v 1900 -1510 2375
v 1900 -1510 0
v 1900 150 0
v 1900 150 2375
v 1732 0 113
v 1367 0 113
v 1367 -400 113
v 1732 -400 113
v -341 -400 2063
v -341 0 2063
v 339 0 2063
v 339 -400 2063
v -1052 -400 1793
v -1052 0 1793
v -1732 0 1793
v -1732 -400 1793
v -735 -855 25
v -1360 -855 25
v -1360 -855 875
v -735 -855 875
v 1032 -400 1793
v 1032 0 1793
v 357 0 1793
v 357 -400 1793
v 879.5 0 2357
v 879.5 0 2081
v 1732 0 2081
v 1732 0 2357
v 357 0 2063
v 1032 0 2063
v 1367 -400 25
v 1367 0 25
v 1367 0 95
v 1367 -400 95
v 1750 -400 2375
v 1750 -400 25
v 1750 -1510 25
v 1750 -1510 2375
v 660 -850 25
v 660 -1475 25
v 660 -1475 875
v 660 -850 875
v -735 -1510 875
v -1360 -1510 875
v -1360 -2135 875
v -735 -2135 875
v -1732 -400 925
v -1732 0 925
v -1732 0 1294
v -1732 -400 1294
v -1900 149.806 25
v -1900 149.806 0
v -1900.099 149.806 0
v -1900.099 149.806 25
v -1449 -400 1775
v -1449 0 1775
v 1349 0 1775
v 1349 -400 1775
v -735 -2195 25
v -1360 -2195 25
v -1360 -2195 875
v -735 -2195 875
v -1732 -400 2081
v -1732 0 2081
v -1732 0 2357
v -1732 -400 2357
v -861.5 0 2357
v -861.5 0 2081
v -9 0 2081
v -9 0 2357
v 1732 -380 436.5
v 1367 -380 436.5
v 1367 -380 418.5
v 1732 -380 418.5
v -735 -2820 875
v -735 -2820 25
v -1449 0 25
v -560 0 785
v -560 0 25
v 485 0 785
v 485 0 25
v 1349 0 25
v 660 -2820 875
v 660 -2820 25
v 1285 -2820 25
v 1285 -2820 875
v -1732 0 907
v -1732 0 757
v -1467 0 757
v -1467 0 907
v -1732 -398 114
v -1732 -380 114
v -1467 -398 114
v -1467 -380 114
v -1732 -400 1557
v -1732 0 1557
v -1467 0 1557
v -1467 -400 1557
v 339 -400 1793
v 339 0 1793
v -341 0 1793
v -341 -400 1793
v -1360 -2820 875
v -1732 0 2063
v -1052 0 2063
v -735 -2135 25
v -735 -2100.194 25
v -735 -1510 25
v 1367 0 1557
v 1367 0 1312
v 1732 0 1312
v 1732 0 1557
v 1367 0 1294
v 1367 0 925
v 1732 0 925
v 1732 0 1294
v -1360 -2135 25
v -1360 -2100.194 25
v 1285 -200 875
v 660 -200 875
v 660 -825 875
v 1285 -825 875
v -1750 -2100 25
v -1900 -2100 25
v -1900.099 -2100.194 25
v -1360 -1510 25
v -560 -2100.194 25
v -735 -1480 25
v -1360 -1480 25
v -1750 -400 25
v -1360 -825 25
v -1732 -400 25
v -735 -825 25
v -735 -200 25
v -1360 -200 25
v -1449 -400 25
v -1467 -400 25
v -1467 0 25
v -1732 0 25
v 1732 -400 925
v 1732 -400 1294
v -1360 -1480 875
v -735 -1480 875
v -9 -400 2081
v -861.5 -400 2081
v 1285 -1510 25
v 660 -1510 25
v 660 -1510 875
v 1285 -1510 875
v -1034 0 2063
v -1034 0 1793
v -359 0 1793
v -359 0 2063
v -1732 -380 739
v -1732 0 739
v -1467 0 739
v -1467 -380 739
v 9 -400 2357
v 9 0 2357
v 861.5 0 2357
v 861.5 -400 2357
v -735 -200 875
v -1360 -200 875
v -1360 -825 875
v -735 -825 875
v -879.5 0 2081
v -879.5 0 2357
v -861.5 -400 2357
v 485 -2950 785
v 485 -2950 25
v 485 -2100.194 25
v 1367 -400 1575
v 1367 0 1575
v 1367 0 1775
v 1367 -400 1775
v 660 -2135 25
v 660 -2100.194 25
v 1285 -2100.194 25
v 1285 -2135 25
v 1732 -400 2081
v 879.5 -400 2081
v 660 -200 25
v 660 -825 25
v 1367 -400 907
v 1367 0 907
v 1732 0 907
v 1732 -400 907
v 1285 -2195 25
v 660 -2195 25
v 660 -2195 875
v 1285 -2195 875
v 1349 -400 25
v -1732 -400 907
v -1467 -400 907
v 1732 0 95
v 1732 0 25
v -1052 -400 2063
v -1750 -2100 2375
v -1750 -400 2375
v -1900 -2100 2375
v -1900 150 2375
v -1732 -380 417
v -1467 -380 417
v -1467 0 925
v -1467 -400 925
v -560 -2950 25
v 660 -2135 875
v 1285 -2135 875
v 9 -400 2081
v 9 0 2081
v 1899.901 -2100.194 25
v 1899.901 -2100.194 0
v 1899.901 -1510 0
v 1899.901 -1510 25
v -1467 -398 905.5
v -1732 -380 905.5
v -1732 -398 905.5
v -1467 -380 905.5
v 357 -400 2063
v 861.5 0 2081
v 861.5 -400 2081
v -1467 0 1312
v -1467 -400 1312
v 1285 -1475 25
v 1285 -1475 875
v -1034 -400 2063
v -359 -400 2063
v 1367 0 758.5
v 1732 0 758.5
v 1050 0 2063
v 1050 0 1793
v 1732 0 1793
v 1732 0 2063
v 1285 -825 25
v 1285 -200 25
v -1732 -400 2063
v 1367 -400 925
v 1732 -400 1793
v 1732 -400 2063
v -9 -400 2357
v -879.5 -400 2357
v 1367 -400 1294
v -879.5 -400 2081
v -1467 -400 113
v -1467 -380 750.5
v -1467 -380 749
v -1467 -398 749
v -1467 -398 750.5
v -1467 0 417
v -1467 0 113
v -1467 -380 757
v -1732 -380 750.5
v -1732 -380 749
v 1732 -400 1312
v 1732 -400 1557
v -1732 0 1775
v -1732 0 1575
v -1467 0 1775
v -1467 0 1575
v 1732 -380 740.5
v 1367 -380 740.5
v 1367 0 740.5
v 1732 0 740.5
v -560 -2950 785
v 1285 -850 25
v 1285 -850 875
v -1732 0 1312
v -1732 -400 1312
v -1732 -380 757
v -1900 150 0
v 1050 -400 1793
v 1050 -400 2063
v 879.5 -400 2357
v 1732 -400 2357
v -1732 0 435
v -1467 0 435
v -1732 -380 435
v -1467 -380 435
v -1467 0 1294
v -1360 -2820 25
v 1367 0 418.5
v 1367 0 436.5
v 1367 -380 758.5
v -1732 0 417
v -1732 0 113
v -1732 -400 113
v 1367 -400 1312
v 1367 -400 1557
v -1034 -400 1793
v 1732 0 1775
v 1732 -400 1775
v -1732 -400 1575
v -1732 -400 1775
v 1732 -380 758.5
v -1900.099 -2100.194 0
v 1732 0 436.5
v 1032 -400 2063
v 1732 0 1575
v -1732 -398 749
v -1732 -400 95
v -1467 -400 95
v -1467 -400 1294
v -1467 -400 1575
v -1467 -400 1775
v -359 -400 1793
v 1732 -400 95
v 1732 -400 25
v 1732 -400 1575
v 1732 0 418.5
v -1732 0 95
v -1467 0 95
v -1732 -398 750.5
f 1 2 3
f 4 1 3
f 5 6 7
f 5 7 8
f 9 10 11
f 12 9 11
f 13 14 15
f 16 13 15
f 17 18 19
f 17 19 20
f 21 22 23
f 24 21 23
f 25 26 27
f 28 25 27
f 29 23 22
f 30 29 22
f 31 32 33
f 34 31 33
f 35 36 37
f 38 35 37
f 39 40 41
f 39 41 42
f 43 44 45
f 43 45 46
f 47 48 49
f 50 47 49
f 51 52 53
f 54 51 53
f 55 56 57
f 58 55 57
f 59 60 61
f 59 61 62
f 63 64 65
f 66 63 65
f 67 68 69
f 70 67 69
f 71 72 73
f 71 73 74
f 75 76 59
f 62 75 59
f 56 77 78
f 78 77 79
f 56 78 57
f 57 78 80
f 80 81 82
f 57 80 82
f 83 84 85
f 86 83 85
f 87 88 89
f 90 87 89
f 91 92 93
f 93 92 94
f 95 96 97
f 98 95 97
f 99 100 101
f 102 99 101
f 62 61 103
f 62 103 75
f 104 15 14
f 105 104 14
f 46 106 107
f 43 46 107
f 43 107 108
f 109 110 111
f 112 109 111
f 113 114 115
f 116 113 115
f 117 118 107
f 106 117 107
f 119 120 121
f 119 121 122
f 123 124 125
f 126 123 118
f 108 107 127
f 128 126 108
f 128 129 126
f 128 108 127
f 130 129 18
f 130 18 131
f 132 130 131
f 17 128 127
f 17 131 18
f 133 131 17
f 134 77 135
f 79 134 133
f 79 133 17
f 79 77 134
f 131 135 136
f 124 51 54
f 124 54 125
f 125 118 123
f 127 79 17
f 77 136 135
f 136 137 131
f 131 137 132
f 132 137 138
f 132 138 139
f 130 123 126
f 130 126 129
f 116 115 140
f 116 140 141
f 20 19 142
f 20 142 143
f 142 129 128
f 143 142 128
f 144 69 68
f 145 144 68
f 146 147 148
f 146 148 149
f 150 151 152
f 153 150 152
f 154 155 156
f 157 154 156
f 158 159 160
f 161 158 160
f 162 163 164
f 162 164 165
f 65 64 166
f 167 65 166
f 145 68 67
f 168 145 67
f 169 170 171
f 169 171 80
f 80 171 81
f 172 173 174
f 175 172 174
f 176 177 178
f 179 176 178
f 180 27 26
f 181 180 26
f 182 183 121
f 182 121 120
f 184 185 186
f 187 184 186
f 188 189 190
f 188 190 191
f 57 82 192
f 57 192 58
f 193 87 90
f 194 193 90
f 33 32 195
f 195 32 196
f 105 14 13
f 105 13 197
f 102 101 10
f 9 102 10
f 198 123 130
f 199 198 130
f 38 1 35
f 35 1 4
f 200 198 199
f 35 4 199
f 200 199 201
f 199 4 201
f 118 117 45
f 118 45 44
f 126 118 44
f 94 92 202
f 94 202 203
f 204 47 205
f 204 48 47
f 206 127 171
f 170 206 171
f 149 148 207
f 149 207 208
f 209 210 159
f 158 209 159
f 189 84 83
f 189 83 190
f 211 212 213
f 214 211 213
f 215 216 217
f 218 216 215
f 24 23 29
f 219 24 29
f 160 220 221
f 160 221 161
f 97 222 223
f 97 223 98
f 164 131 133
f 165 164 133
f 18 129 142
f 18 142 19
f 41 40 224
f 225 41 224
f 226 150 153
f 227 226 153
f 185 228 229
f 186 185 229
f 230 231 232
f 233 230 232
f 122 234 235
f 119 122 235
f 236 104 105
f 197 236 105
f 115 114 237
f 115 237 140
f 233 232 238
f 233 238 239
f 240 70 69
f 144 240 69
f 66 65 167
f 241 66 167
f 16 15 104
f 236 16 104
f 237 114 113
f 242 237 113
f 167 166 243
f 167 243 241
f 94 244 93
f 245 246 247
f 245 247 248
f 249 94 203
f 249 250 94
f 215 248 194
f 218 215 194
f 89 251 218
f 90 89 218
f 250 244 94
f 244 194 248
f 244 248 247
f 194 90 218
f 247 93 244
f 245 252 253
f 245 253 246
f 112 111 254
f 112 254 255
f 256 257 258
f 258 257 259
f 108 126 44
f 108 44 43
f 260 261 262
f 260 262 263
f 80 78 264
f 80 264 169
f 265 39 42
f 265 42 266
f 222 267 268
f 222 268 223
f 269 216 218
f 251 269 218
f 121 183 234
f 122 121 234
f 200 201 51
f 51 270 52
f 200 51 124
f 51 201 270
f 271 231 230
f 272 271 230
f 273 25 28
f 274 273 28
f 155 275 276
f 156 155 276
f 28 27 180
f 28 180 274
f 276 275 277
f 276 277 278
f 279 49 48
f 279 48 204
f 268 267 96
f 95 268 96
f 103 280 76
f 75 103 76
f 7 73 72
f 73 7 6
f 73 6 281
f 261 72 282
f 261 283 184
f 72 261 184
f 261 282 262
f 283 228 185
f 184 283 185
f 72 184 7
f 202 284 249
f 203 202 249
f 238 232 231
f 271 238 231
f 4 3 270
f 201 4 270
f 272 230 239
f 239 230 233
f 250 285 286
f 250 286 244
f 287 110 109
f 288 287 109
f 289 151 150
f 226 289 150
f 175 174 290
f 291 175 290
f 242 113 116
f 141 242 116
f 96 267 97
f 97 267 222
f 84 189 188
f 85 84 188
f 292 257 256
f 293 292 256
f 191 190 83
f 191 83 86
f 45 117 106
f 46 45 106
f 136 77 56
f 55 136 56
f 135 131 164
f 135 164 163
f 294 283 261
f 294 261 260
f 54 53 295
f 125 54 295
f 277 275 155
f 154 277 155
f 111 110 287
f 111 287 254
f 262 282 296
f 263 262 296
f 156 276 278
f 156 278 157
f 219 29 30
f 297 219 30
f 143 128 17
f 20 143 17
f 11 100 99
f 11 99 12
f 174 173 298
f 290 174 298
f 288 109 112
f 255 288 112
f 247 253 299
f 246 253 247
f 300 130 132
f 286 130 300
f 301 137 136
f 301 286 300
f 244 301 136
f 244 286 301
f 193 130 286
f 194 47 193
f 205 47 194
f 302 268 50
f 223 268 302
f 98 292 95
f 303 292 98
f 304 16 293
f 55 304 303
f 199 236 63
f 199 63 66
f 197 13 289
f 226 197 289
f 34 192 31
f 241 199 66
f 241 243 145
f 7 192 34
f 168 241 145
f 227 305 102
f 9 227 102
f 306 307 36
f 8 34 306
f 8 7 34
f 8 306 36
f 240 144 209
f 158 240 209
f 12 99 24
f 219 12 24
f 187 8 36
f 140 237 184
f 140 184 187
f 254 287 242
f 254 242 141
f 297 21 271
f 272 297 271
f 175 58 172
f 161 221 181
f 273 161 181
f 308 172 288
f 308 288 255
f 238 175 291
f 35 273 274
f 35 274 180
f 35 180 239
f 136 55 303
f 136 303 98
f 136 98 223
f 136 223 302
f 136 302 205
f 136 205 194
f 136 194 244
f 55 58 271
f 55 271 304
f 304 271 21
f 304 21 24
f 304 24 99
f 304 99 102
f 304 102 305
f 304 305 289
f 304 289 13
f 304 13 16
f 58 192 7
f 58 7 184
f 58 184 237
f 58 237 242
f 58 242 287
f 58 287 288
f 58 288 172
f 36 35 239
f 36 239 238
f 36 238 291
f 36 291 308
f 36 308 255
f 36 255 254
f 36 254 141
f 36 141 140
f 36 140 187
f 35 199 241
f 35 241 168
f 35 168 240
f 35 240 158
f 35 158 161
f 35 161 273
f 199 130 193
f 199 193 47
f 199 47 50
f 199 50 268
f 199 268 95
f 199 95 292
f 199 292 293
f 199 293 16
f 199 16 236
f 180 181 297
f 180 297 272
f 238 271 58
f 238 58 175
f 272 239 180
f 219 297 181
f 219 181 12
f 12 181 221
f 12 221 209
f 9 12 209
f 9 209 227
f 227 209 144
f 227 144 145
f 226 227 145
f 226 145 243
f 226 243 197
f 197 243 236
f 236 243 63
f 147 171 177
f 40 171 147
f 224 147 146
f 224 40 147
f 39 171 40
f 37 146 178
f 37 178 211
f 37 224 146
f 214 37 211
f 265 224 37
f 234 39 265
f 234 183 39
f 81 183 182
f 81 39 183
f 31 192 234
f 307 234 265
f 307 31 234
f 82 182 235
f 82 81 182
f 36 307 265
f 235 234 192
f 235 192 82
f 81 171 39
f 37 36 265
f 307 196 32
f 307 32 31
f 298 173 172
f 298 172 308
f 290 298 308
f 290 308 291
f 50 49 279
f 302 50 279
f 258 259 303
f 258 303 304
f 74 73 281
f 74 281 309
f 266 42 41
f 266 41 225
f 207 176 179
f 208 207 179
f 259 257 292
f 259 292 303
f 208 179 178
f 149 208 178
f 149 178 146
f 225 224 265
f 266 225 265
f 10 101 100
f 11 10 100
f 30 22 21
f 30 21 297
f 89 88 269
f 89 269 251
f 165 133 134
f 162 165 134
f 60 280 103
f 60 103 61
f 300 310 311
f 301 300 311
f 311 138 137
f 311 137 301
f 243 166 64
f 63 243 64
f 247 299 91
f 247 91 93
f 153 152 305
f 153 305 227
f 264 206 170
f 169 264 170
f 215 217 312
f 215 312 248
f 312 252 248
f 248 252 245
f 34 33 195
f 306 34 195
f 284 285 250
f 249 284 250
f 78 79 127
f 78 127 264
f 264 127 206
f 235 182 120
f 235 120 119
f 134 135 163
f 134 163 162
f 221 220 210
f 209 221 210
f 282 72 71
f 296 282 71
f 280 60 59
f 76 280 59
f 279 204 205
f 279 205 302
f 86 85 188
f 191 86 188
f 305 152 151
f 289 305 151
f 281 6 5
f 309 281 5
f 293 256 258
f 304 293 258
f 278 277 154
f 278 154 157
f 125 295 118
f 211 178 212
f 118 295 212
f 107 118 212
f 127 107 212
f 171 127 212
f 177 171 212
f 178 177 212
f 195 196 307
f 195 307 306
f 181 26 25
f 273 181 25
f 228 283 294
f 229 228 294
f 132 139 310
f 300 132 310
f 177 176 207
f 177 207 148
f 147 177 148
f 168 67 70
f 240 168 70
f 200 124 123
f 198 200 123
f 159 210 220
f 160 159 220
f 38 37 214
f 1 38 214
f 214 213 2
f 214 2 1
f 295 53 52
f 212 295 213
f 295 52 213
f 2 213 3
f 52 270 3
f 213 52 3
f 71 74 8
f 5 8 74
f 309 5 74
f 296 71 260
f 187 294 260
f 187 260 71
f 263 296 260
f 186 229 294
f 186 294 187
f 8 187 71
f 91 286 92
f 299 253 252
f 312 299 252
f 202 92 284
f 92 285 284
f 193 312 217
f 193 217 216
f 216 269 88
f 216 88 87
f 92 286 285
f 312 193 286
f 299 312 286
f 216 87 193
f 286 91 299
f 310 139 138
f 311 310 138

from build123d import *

# Parameters (mm, degrees)
F1_DEPTH  = 2375
F3_DEPTH  = 25
F4_W      = 1045
F4_H      = 2100.1937389374
F4_H_2    = 849.8062610626
F5_DEPTH  = 760
F6_W      = 625
F6_H      = 625
F7_DEPTH  = 850
F8_W      = 18
F8_H      = 1750
F8_H_2    = 18
F8_H_3    = 564
F9_DEPTH  = 400
F11_DEPTH = 400
F12_W     = 18
F12_H     = 276
F13_DEPTH = 400
F14_W     = 18
F14_H     = 270
F15_DEPTH = 400
F16_W     = 265
F16_H     = 18
F17_DEPTH = 380
F18_DEPTH = 20
F19_W     = 265
F19_H     = 18
F20_DEPTH = 400
F21_W     = 265
F21_H     = 155
F21_H_2   = 635
F22_DEPTH = 18
F23_W     = 365
F23_H     = 18
F24_DEPTH = 400
F25_W     = 365
F25_H     = 18
F26_DEPTH = 380


with BuildPart() as f1:
    # F0 (on Top) → F1 (new body)
    with BuildSketch(Plane.XY):
        Polygon((-1750, 0), (-1e-10, 0), (1750.0000000001, 0), (1750, -1510), (1900, -1510), (1900, 150), (-1900, 150), (-1900, -2100), (-1750, -2100), align=None)
    extrude(amount=F1_DEPTH)

    # F2 (on face) → F3 (join)
    with BuildSketch(Plane.XY):
        Polygon((-1900.0992774963, 149.8062610626), (-1900.0992774963, -2100.1937389374), (1899.9007225037, -2100.1937389374), (1899.9007225037, -1510), (1750, -1510), (1750, 0), (2e-10, 0), (-1750, 0), (-1750, -2100), (-1900, -2100), (-1900, 149.8062610626), align=None)
    extrude(amount=F3_DEPTH)

    # F4 (on face) → F5 (join)
    with BuildSketch(Plane.XY.offset(25)):
        with Locations((-37.5, -1050.0968694687)):
            Rectangle(F4_W, F4_H)
        with Locations((-37.5, -2525.0968694687)):
            Rectangle(F4_W, F4_H_2)
    extrude(amount=F5_DEPTH)

    # F6 (on face) → F7, piece 2 (join)
    with BuildSketch(Plane.XY.offset(25)):
        with Locations((-1047.5, -1822.5)):
            Rectangle(F6_W, F6_H)
        with Locations((-1047.5, -1167.5)):
            Rectangle(F6_W, F6_H)
        with Locations((-1047.5, -512.5)):
            Rectangle(F6_W, F6_H)
        with Locations((972.5, -512.5)):
            Rectangle(F6_W, F6_H)
        with Locations((972.5, -1162.5)):
            Rectangle(F6_W, F6_H)
        with Locations((972.5, -1822.5)):
            Rectangle(F6_W, F6_H)
    extrude(amount=F7_DEPTH)

    # F8 (on face) → F9 (join)
    with BuildSketch(Plane.XZ):
        Polygon((-1732, 1793), (-1750, 1793), (-1750, 1775), (-1732, 1775), (-1467, 1775), (-1449, 1775), (1349, 1775), (1367, 1775), (1732, 1775), (1750, 1775), (1750, 1793), (1732, 1793), align=None)
        Polygon((1750, 2375), (-1732, 2375), (-1732, 2357), (1732, 2357), (1750, 2357), align=None)
        with Locations((-1458, 900)):
            Rectangle(F8_W, F8_H)
        with Locations((-1741, 2366)):
            Rectangle(F8_W, F8_H_2)
        with Locations((-1741, 2075)):
            Rectangle(F8_W, F8_H_3)
        with Locations((1358, 900)):
            Rectangle(F8_W, F8_H)
        with Locations((1741, 900)):
            Rectangle(F8_W, F8_H)
        with Locations((1741, 2075)):
            Rectangle(F8_W, F8_H_3)
        with Locations((-1741, 900)):
            Rectangle(F8_W, F8_H)
    extrude(amount=F9_DEPTH)

    # F10 (on face) → F11 (join)
    with BuildSketch(Plane.XZ):
        Polygon((1732, 2063), (1732, 2075), (1732, 2081), (-1732, 2081), (-1732, 2063), align=None)
    extrude(amount=F11_DEPTH)

    # F12 (on face) → F13 (join)
    with BuildSketch(Plane.XZ):
        Polygon((-9, 2081), (0, 2081), (9, 2081), (9, 2357), (-9, 2357), align=None)
        with Locations((-870.5, 2219)):
            Rectangle(F12_W, F12_H)
        with Locations((870.5, 2219)):
            Rectangle(F12_W, F12_H)
    extrude(amount=F13_DEPTH)

    # F14 (on face) → F15 (join)
    with BuildSketch(Plane.XZ):
        with Locations((1041, 1928)):
            Rectangle(F14_W, F14_H)
        with Locations((-1043, 1928)):
            Rectangle(F14_W, F14_H)
        with Locations((-350, 1928)):
            Rectangle(F14_W, F14_H)
        with Locations((348, 1928)):
            Rectangle(F14_W, F14_H)
    extrude(amount=F15_DEPTH)

    # F16 (on face) → F17 (join)
    with BuildSketch(Plane.XZ):
        with Locations((-1599.5, 916)):
            Rectangle(F16_W, F16_H)
        with Locations((-1599.5, 748)):
            Rectangle(F16_W, F16_H)
        with Locations((-1599.5, 426)):
            Rectangle(F16_W, F16_H)
        with Locations((-1599.5, 104)):
            Rectangle(F16_W, F16_H)
    extrude(amount=F17_DEPTH)

    # F18 (add): faces of the model
    f18_faces = [f1.faces().sort_by_distance(p)[0] for p in [
        (-1599.5, -380, 916),
        (-1599.5, -380, 104),
    ]]
    extrude(f18_faces, amount=F18_DEPTH)

    # F19 (on face) → F20 (join)
    with BuildSketch(Plane.XZ):
        with Locations((-1599.5, 1303)):
            Rectangle(F19_W, F19_H)
        with Locations((-1599.5, 1566)):
            Rectangle(F19_W, F19_H)
    extrude(amount=F20_DEPTH)

    # F21 (on face) → F22 (join)
    with BuildSketch(Plane.XZ.offset(380)):
        with Locations((-1599.5, 828)):
            Rectangle(F21_W, F21_H)
        with Locations((-1599.5, 431.5)):
            Rectangle(F21_W, F21_H_2)
    extrude(amount=F22_DEPTH)

    # F23 (on face) → F24 (join)
    with BuildSketch(Plane.XZ):
        with Locations((1549.5, 1566)):
            Rectangle(F23_W, F23_H)
        with Locations((1549.5, 1303)):
            Rectangle(F23_W, F23_H)
        with Locations((1549.5, 104)):
            Rectangle(F23_W, F23_H)
        with Locations((1549.5, 916)):
            Rectangle(F23_W, F23_H)
    extrude(amount=F24_DEPTH)

    # F25 (on face) → F26 (join)
    with BuildSketch(Plane.XZ):
        with Locations((1549.5, 749.5)):
            Rectangle(F25_W, F25_H)
        with Locations((1549.5, 427.5)):
            Rectangle(F25_W, F25_H)
    extrude(amount=F26_DEPTH)


with BuildPart() as f7:
    # F6 (on face) → F7 (new body)
    with BuildSketch(Plane.XY.offset(25)):
        with Locations((-1047.5, -2507.5)):
            Rectangle(F6_W, F6_H)
    extrude(amount=F7_DEPTH)


with BuildPart() as f7b:
    # F6 (on face) → F7, piece 3 (new body)
    with BuildSketch(Plane.XY.offset(25)):
        with Locations((972.5, -2507.5)):
            Rectangle(F6_W, F6_H)
    extrude(amount=F7_DEPTH)


solid = Compound([f1.part, f7.part, f7b.part])
